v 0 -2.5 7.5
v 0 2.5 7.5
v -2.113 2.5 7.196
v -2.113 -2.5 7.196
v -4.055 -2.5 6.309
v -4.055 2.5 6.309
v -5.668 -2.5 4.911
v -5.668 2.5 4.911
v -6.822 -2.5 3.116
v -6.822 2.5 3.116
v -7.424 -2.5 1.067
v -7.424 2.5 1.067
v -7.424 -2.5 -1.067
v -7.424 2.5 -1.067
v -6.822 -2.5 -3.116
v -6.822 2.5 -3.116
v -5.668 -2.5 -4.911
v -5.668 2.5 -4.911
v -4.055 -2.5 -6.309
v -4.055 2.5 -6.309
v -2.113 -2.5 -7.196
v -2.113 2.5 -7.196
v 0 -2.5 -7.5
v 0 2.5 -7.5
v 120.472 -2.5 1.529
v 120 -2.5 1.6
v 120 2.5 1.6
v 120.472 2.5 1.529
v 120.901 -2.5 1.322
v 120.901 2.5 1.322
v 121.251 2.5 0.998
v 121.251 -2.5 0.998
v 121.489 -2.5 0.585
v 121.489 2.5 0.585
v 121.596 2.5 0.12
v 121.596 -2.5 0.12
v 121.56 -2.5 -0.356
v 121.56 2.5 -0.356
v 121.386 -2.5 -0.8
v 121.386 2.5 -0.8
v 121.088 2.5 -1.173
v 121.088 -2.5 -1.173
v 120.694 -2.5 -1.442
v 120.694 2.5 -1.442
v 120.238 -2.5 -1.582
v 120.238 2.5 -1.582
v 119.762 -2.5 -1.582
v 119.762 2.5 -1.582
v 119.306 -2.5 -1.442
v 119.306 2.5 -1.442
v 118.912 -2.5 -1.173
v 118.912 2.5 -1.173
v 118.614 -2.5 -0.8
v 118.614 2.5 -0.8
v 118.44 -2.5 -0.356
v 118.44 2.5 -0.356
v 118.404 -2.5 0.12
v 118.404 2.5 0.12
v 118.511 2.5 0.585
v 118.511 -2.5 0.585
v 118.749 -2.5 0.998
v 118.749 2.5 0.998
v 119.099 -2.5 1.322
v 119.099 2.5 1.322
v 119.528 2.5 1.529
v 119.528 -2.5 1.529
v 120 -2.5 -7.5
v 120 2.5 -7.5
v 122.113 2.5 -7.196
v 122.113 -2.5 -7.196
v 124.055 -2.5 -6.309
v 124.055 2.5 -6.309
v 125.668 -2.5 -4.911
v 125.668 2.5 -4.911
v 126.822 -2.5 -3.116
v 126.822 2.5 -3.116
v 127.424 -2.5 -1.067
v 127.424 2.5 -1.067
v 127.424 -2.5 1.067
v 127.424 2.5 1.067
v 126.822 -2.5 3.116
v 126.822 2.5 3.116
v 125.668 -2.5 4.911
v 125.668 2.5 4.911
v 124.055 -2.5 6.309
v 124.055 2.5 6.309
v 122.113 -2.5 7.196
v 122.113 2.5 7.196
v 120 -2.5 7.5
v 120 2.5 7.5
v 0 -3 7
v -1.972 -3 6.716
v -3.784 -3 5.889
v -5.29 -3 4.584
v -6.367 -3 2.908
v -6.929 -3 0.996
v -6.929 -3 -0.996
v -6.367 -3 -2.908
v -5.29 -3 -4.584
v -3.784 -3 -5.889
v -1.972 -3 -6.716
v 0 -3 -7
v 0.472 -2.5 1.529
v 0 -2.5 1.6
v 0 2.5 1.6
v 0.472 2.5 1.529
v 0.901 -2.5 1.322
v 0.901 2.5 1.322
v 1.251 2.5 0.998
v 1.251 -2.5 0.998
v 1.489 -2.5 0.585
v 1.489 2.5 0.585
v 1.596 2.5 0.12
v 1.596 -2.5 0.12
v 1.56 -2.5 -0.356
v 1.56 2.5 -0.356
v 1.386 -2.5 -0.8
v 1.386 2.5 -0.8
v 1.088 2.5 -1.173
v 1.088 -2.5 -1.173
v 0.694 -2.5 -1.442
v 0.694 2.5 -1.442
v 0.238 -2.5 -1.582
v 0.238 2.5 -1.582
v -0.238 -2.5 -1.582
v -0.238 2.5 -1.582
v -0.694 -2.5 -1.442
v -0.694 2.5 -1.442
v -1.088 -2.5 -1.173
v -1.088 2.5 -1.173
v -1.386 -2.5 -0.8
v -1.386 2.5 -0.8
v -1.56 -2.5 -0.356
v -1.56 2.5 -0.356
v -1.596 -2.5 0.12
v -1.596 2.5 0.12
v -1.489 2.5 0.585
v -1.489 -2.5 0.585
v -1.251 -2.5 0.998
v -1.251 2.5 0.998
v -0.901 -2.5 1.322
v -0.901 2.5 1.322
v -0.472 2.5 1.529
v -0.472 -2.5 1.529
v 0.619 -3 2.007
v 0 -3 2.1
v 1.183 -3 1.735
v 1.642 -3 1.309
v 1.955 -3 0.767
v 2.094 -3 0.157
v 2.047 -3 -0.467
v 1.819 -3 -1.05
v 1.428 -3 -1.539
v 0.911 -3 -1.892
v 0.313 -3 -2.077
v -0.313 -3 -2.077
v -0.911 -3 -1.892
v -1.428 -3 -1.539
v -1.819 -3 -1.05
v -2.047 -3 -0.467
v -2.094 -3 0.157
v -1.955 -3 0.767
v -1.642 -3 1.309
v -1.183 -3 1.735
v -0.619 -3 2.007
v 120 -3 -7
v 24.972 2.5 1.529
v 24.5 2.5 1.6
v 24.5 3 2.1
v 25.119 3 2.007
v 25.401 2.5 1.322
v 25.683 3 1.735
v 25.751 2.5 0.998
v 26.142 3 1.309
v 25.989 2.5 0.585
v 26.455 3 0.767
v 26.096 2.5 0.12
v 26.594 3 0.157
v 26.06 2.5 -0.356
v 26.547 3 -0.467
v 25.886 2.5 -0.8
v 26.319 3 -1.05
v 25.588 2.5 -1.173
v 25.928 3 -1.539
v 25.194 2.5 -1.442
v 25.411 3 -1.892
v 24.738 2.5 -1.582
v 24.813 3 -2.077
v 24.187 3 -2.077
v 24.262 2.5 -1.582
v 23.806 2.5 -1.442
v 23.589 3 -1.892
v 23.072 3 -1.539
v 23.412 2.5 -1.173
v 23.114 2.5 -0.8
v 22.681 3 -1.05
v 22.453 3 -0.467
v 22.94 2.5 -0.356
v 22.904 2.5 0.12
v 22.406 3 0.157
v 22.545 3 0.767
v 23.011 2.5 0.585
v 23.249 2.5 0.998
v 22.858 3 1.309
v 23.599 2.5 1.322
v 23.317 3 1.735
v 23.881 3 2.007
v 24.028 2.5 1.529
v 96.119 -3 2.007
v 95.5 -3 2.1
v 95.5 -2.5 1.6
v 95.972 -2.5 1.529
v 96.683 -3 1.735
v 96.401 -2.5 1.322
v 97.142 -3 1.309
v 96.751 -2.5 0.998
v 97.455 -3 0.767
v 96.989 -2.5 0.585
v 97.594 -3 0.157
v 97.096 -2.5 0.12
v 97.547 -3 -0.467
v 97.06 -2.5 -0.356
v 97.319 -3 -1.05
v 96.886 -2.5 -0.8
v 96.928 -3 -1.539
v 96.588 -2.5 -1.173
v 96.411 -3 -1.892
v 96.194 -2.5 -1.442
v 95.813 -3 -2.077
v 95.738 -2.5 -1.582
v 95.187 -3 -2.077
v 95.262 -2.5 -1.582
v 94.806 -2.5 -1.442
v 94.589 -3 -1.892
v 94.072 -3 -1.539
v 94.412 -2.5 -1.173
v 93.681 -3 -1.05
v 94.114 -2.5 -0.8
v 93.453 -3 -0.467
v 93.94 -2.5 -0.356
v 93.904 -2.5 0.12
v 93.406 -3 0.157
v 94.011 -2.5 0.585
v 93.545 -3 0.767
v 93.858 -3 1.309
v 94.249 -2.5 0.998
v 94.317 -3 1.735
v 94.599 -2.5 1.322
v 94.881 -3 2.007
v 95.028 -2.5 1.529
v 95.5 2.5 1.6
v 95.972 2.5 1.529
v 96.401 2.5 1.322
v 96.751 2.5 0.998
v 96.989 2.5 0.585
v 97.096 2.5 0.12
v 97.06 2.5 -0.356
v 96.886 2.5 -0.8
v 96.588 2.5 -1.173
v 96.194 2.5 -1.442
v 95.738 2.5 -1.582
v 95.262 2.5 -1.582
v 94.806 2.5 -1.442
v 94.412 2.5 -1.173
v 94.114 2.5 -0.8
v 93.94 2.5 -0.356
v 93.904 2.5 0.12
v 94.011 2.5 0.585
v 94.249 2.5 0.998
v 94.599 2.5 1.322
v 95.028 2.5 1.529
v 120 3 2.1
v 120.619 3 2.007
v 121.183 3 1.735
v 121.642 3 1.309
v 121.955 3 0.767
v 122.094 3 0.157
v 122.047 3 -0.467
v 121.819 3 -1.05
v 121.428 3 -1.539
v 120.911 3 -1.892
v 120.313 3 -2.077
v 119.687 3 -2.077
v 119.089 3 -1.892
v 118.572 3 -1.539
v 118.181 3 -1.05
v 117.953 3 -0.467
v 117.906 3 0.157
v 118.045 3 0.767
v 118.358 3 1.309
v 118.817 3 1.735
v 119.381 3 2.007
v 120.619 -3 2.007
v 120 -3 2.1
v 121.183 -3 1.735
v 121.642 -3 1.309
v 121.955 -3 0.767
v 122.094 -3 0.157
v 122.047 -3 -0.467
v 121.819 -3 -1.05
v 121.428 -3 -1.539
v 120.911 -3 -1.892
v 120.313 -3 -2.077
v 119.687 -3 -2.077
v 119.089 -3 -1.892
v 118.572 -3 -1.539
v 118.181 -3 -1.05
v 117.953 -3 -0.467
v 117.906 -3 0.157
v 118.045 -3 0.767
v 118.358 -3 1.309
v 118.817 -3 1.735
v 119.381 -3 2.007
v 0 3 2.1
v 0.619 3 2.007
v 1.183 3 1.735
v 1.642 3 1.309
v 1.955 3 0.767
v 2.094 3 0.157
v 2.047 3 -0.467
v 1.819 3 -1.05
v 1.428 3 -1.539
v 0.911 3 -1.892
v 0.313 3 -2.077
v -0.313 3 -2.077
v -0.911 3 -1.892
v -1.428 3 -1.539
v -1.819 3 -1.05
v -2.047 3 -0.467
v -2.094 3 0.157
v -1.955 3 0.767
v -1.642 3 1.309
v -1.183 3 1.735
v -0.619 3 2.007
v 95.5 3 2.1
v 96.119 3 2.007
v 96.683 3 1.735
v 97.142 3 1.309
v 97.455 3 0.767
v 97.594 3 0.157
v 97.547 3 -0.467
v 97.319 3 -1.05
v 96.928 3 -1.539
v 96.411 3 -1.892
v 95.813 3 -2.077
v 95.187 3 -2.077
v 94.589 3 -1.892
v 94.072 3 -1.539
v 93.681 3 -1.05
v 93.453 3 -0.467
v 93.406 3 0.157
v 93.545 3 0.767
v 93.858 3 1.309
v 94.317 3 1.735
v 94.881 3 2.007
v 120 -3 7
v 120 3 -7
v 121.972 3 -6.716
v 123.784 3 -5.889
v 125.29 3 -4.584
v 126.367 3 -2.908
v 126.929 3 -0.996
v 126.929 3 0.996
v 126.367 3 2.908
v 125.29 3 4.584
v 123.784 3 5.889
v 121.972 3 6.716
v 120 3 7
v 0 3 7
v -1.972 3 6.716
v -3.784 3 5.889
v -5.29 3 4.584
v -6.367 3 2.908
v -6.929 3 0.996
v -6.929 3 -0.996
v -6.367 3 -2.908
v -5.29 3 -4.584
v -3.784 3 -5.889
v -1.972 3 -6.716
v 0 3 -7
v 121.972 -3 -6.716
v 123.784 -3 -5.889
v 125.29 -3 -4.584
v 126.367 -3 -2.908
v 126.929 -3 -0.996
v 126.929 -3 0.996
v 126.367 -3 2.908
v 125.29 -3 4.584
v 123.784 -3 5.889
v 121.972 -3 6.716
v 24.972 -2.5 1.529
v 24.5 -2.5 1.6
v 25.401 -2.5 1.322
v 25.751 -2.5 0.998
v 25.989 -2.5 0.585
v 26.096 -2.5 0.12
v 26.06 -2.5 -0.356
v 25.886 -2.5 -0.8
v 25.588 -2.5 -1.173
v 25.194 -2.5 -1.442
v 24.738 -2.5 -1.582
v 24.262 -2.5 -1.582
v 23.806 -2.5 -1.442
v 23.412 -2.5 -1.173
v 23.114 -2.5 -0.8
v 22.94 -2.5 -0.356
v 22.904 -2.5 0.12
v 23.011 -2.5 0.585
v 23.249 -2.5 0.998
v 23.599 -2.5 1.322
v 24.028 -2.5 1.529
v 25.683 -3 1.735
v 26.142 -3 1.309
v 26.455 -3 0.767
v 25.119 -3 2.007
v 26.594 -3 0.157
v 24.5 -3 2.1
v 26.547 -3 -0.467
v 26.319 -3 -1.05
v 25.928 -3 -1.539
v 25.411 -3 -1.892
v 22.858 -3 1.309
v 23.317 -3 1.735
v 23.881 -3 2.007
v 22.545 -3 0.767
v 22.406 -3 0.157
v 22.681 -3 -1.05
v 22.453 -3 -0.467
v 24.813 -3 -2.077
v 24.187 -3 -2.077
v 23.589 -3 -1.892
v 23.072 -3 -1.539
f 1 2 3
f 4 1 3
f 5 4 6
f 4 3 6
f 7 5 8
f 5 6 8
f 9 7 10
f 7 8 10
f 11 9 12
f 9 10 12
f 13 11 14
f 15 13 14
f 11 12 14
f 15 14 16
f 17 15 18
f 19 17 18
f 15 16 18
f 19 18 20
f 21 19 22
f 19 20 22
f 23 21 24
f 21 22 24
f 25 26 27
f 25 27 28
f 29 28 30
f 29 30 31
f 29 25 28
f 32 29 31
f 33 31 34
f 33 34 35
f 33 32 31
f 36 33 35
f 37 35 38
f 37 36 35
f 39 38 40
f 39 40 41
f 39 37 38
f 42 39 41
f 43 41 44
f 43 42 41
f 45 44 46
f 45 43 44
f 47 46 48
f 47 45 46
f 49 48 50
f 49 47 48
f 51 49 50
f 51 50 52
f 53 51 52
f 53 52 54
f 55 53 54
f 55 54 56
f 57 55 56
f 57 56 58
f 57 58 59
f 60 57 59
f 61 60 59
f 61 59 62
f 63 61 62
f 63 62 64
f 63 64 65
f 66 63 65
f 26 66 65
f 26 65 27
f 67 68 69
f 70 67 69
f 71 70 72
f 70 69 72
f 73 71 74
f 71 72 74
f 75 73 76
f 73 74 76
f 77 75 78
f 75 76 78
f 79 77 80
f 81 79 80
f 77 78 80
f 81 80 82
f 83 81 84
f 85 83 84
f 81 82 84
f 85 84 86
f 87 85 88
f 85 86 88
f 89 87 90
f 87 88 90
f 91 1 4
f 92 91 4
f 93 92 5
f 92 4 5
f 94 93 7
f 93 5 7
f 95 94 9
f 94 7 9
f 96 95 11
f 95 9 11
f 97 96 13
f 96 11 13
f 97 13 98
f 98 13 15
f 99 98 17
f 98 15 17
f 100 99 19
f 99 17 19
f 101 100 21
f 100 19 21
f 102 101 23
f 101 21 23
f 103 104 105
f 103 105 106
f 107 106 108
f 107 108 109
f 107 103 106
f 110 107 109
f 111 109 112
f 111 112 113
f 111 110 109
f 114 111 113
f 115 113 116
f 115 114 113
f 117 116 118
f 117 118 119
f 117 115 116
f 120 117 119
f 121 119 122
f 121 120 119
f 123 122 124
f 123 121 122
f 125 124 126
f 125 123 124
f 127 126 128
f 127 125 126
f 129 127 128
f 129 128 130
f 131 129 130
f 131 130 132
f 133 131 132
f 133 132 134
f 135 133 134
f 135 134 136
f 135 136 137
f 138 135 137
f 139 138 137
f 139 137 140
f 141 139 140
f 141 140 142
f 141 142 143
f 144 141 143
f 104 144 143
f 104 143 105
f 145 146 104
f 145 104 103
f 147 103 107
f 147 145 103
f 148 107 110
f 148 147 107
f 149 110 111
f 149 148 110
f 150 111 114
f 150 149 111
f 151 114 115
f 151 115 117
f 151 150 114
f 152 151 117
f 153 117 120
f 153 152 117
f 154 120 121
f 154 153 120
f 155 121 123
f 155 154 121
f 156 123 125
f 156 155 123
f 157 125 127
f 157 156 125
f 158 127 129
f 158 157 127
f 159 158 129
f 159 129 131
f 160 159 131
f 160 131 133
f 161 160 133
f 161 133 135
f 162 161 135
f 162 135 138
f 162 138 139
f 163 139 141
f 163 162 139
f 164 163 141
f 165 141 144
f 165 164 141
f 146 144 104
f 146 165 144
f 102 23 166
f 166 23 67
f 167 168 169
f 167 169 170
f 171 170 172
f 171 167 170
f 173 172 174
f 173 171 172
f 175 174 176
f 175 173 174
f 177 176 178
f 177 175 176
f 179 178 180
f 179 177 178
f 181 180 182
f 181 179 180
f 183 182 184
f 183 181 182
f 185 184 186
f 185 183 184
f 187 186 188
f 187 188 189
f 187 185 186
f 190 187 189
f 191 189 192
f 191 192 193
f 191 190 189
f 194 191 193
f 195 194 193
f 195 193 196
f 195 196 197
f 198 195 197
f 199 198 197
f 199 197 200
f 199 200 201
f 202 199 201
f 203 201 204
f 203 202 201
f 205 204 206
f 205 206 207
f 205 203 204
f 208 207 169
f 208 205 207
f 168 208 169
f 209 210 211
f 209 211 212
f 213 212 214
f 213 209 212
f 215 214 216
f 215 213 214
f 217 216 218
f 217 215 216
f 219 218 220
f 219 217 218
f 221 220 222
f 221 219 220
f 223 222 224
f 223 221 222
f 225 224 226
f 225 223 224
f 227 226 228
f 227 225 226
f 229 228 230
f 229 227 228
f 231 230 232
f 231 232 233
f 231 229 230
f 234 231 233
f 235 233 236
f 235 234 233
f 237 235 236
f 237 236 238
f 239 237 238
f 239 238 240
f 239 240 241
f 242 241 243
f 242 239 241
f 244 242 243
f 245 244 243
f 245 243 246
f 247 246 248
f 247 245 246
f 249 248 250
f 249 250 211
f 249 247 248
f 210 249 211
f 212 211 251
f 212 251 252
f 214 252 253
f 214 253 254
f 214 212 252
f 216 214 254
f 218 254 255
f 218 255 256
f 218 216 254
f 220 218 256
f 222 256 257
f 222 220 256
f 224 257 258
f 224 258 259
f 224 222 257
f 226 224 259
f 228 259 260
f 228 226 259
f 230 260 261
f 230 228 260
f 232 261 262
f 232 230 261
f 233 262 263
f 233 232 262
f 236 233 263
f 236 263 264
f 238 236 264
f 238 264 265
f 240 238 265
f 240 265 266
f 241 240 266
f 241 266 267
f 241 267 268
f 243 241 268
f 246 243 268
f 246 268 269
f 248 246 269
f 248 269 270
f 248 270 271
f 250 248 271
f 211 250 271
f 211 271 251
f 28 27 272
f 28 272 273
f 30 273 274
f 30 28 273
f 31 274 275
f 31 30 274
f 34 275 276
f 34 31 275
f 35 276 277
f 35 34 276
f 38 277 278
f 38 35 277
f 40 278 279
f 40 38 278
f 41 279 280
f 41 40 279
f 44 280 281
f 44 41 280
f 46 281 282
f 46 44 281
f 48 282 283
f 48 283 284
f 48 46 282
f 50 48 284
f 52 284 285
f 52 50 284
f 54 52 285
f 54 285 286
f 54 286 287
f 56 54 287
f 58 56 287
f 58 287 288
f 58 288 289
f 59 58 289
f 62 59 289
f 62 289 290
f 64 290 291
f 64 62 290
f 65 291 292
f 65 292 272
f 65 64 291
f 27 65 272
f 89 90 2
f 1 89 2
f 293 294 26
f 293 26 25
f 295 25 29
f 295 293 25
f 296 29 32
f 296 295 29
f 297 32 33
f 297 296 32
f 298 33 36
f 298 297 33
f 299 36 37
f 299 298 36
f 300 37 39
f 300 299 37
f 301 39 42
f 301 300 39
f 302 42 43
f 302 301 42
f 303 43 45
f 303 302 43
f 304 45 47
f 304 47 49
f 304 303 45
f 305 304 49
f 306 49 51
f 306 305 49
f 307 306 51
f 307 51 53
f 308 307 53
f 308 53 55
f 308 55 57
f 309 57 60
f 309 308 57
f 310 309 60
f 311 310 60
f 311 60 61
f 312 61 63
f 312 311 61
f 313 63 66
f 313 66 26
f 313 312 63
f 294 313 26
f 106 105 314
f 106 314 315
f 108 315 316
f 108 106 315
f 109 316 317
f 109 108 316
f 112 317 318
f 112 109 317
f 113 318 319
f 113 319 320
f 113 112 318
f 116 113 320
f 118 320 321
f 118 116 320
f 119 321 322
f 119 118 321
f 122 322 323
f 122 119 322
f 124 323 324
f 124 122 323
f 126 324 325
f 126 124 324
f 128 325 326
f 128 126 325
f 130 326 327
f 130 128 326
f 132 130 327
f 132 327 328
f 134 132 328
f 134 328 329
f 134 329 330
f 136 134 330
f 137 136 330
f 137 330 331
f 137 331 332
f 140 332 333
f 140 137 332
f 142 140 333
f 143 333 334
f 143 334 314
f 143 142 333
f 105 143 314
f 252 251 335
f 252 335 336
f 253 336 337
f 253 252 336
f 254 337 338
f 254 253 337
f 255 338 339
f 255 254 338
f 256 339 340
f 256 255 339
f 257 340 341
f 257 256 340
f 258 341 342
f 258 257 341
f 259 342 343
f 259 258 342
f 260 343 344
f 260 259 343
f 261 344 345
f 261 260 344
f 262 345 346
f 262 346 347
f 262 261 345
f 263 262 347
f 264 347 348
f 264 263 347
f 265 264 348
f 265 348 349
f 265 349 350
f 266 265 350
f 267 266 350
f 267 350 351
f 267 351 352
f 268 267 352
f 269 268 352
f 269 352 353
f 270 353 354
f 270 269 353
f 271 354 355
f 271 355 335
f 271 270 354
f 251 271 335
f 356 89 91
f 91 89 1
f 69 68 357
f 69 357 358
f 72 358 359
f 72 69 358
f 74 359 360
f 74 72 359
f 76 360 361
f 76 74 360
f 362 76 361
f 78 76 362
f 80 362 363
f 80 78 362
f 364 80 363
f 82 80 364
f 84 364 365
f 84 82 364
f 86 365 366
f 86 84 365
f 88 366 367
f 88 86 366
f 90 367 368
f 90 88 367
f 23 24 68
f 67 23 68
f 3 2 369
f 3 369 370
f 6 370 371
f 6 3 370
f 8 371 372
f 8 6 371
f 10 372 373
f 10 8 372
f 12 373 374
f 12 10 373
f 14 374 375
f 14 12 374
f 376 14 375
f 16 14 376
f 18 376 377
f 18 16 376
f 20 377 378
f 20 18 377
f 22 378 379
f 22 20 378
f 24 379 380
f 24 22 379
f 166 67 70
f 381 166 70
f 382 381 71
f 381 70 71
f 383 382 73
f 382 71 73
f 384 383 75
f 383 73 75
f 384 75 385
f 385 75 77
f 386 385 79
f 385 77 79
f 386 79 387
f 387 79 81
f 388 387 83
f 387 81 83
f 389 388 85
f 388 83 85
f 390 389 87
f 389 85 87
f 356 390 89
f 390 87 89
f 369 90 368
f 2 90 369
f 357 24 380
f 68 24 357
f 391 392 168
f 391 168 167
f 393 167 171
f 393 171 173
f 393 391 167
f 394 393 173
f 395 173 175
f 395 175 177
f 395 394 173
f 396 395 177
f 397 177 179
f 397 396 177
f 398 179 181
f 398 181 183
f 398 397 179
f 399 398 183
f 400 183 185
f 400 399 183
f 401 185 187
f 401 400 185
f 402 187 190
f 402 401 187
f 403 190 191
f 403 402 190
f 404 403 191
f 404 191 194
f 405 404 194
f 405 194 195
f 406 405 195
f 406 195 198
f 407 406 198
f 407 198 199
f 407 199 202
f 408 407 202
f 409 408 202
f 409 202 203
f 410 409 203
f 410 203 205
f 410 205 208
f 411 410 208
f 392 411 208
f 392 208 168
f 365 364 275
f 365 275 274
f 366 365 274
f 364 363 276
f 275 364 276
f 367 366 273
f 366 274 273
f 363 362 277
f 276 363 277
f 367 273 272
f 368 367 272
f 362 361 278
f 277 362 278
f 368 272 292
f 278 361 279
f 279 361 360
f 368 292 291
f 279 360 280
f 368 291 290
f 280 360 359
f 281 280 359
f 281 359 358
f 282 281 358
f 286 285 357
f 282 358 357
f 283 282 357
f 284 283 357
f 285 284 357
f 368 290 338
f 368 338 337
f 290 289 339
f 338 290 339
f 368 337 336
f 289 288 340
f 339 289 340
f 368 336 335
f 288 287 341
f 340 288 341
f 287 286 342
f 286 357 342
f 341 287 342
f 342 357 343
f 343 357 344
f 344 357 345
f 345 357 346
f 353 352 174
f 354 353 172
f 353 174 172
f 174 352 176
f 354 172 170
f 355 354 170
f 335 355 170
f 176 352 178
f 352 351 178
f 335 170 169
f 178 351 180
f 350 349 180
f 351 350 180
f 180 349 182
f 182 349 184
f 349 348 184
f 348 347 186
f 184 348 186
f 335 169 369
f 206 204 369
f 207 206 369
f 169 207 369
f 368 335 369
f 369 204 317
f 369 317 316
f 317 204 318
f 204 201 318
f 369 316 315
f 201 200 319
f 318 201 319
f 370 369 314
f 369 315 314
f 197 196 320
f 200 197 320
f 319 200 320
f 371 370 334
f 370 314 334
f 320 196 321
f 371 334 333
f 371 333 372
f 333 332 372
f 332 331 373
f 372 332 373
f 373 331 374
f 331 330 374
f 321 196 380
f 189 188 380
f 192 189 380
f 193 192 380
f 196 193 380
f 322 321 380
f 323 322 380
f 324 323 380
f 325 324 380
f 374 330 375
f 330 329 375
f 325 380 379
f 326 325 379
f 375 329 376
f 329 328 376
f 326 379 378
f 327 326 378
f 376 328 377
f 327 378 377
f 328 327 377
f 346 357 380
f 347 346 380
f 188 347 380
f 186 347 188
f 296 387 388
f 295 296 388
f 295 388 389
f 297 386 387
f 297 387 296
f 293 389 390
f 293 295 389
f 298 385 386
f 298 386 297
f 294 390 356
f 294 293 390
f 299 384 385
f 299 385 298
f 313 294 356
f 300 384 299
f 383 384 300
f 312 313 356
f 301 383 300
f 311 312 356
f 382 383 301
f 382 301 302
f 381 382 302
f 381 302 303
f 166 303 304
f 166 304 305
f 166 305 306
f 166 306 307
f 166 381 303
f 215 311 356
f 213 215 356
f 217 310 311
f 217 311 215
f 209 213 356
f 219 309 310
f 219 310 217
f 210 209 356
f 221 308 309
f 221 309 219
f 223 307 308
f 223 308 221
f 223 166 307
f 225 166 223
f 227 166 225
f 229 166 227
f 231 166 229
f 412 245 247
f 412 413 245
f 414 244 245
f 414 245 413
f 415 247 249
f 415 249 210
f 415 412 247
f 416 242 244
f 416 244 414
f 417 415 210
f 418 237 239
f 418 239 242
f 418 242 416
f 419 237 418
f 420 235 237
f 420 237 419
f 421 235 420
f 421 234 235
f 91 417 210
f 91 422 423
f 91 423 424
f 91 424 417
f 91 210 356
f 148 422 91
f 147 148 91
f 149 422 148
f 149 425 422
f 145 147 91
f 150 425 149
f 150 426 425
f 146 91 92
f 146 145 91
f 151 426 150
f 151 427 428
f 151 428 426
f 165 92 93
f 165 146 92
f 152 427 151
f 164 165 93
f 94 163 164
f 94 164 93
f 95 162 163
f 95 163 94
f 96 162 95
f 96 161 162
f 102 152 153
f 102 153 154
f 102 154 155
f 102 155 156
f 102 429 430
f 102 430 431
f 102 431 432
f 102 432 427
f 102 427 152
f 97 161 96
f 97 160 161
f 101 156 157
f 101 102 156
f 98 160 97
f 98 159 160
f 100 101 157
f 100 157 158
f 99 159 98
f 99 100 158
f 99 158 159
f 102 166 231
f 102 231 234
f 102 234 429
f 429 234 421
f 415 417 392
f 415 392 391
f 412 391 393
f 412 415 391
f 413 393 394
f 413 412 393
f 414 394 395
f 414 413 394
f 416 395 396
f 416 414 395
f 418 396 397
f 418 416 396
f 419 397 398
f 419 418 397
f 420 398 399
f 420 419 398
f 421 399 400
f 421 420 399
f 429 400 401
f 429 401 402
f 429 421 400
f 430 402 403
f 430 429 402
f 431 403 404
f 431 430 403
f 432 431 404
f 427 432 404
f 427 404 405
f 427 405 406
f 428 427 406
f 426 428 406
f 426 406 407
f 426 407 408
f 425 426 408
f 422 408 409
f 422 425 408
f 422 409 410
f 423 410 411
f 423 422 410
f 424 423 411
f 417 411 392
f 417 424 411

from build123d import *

# Parameters (mm, degrees)
SKETCH1_R           = 1.6
BOSS_EXTRUDE1_DEPTH = 3
CHAMFER1_SIZE       = 0.5


with BuildPart() as part:
    # Sketch1 → Boss-Extrude1 (new, symmetric)
    with BuildSketch(Plane(origin=(0, 0, 0), x_dir=(1, 0, 0), z_dir=(0, 1, 0))):
        with BuildLine():
            Line((0, 7.5), (120, 7.5))
            ThreePointArc((120, 7.5), (127.5, 0), (120, -7.5))
            Line((120, -7.5), (0, -7.5))
            ThreePointArc((0, -7.5), (-7.5, 0), (0, 7.5))
        make_face()
        with Locations(Location((0, 0, 0), (0, 0, 270))):
            Circle(SKETCH1_R, mode=Mode.SUBTRACT)
        with Locations(Location((120, 0, 0), (0, 0, 270))):
            Circle(SKETCH1_R, mode=Mode.SUBTRACT)
        with Locations(Location((24.5, 0, 0), (0, 0, 270))):
            Circle(SKETCH1_R, mode=Mode.SUBTRACT)
        with Locations(Location((95.5, 0, 0), (0, 0, 270))):
            Circle(SKETCH1_R, mode=Mode.SUBTRACT)
    extrude(amount=BOSS_EXTRUDE1_DEPTH, both=True)

    # Chamfer1
    chamfer1_edges = [part.edges().sort_by_distance(p)[0] for p in [
        (95.5, 3, -1.6),
        (-7.5, -3, 0),
        (60, -3, -7.5),
        (127.5, -3, 0),
        (60, -3, 7.5),
        (120, -3, -1.6),
        (0, -3, -1.6),
        (24.5, -3, -1.6),
        (95.5, -3, -1.6),
        (24.5, 3, -1.6),
        (0, 3, -1.6),
        (120, 3, -1.6),
        (60, 3, 7.5),
        (127.5, 3, 0),
        (60, 3, -7.5),
        (-7.5, 3, 0),
    ]]
    chamfer(chamfer1_edges, length=CHAMFER1_SIZE)


solid = part.part
